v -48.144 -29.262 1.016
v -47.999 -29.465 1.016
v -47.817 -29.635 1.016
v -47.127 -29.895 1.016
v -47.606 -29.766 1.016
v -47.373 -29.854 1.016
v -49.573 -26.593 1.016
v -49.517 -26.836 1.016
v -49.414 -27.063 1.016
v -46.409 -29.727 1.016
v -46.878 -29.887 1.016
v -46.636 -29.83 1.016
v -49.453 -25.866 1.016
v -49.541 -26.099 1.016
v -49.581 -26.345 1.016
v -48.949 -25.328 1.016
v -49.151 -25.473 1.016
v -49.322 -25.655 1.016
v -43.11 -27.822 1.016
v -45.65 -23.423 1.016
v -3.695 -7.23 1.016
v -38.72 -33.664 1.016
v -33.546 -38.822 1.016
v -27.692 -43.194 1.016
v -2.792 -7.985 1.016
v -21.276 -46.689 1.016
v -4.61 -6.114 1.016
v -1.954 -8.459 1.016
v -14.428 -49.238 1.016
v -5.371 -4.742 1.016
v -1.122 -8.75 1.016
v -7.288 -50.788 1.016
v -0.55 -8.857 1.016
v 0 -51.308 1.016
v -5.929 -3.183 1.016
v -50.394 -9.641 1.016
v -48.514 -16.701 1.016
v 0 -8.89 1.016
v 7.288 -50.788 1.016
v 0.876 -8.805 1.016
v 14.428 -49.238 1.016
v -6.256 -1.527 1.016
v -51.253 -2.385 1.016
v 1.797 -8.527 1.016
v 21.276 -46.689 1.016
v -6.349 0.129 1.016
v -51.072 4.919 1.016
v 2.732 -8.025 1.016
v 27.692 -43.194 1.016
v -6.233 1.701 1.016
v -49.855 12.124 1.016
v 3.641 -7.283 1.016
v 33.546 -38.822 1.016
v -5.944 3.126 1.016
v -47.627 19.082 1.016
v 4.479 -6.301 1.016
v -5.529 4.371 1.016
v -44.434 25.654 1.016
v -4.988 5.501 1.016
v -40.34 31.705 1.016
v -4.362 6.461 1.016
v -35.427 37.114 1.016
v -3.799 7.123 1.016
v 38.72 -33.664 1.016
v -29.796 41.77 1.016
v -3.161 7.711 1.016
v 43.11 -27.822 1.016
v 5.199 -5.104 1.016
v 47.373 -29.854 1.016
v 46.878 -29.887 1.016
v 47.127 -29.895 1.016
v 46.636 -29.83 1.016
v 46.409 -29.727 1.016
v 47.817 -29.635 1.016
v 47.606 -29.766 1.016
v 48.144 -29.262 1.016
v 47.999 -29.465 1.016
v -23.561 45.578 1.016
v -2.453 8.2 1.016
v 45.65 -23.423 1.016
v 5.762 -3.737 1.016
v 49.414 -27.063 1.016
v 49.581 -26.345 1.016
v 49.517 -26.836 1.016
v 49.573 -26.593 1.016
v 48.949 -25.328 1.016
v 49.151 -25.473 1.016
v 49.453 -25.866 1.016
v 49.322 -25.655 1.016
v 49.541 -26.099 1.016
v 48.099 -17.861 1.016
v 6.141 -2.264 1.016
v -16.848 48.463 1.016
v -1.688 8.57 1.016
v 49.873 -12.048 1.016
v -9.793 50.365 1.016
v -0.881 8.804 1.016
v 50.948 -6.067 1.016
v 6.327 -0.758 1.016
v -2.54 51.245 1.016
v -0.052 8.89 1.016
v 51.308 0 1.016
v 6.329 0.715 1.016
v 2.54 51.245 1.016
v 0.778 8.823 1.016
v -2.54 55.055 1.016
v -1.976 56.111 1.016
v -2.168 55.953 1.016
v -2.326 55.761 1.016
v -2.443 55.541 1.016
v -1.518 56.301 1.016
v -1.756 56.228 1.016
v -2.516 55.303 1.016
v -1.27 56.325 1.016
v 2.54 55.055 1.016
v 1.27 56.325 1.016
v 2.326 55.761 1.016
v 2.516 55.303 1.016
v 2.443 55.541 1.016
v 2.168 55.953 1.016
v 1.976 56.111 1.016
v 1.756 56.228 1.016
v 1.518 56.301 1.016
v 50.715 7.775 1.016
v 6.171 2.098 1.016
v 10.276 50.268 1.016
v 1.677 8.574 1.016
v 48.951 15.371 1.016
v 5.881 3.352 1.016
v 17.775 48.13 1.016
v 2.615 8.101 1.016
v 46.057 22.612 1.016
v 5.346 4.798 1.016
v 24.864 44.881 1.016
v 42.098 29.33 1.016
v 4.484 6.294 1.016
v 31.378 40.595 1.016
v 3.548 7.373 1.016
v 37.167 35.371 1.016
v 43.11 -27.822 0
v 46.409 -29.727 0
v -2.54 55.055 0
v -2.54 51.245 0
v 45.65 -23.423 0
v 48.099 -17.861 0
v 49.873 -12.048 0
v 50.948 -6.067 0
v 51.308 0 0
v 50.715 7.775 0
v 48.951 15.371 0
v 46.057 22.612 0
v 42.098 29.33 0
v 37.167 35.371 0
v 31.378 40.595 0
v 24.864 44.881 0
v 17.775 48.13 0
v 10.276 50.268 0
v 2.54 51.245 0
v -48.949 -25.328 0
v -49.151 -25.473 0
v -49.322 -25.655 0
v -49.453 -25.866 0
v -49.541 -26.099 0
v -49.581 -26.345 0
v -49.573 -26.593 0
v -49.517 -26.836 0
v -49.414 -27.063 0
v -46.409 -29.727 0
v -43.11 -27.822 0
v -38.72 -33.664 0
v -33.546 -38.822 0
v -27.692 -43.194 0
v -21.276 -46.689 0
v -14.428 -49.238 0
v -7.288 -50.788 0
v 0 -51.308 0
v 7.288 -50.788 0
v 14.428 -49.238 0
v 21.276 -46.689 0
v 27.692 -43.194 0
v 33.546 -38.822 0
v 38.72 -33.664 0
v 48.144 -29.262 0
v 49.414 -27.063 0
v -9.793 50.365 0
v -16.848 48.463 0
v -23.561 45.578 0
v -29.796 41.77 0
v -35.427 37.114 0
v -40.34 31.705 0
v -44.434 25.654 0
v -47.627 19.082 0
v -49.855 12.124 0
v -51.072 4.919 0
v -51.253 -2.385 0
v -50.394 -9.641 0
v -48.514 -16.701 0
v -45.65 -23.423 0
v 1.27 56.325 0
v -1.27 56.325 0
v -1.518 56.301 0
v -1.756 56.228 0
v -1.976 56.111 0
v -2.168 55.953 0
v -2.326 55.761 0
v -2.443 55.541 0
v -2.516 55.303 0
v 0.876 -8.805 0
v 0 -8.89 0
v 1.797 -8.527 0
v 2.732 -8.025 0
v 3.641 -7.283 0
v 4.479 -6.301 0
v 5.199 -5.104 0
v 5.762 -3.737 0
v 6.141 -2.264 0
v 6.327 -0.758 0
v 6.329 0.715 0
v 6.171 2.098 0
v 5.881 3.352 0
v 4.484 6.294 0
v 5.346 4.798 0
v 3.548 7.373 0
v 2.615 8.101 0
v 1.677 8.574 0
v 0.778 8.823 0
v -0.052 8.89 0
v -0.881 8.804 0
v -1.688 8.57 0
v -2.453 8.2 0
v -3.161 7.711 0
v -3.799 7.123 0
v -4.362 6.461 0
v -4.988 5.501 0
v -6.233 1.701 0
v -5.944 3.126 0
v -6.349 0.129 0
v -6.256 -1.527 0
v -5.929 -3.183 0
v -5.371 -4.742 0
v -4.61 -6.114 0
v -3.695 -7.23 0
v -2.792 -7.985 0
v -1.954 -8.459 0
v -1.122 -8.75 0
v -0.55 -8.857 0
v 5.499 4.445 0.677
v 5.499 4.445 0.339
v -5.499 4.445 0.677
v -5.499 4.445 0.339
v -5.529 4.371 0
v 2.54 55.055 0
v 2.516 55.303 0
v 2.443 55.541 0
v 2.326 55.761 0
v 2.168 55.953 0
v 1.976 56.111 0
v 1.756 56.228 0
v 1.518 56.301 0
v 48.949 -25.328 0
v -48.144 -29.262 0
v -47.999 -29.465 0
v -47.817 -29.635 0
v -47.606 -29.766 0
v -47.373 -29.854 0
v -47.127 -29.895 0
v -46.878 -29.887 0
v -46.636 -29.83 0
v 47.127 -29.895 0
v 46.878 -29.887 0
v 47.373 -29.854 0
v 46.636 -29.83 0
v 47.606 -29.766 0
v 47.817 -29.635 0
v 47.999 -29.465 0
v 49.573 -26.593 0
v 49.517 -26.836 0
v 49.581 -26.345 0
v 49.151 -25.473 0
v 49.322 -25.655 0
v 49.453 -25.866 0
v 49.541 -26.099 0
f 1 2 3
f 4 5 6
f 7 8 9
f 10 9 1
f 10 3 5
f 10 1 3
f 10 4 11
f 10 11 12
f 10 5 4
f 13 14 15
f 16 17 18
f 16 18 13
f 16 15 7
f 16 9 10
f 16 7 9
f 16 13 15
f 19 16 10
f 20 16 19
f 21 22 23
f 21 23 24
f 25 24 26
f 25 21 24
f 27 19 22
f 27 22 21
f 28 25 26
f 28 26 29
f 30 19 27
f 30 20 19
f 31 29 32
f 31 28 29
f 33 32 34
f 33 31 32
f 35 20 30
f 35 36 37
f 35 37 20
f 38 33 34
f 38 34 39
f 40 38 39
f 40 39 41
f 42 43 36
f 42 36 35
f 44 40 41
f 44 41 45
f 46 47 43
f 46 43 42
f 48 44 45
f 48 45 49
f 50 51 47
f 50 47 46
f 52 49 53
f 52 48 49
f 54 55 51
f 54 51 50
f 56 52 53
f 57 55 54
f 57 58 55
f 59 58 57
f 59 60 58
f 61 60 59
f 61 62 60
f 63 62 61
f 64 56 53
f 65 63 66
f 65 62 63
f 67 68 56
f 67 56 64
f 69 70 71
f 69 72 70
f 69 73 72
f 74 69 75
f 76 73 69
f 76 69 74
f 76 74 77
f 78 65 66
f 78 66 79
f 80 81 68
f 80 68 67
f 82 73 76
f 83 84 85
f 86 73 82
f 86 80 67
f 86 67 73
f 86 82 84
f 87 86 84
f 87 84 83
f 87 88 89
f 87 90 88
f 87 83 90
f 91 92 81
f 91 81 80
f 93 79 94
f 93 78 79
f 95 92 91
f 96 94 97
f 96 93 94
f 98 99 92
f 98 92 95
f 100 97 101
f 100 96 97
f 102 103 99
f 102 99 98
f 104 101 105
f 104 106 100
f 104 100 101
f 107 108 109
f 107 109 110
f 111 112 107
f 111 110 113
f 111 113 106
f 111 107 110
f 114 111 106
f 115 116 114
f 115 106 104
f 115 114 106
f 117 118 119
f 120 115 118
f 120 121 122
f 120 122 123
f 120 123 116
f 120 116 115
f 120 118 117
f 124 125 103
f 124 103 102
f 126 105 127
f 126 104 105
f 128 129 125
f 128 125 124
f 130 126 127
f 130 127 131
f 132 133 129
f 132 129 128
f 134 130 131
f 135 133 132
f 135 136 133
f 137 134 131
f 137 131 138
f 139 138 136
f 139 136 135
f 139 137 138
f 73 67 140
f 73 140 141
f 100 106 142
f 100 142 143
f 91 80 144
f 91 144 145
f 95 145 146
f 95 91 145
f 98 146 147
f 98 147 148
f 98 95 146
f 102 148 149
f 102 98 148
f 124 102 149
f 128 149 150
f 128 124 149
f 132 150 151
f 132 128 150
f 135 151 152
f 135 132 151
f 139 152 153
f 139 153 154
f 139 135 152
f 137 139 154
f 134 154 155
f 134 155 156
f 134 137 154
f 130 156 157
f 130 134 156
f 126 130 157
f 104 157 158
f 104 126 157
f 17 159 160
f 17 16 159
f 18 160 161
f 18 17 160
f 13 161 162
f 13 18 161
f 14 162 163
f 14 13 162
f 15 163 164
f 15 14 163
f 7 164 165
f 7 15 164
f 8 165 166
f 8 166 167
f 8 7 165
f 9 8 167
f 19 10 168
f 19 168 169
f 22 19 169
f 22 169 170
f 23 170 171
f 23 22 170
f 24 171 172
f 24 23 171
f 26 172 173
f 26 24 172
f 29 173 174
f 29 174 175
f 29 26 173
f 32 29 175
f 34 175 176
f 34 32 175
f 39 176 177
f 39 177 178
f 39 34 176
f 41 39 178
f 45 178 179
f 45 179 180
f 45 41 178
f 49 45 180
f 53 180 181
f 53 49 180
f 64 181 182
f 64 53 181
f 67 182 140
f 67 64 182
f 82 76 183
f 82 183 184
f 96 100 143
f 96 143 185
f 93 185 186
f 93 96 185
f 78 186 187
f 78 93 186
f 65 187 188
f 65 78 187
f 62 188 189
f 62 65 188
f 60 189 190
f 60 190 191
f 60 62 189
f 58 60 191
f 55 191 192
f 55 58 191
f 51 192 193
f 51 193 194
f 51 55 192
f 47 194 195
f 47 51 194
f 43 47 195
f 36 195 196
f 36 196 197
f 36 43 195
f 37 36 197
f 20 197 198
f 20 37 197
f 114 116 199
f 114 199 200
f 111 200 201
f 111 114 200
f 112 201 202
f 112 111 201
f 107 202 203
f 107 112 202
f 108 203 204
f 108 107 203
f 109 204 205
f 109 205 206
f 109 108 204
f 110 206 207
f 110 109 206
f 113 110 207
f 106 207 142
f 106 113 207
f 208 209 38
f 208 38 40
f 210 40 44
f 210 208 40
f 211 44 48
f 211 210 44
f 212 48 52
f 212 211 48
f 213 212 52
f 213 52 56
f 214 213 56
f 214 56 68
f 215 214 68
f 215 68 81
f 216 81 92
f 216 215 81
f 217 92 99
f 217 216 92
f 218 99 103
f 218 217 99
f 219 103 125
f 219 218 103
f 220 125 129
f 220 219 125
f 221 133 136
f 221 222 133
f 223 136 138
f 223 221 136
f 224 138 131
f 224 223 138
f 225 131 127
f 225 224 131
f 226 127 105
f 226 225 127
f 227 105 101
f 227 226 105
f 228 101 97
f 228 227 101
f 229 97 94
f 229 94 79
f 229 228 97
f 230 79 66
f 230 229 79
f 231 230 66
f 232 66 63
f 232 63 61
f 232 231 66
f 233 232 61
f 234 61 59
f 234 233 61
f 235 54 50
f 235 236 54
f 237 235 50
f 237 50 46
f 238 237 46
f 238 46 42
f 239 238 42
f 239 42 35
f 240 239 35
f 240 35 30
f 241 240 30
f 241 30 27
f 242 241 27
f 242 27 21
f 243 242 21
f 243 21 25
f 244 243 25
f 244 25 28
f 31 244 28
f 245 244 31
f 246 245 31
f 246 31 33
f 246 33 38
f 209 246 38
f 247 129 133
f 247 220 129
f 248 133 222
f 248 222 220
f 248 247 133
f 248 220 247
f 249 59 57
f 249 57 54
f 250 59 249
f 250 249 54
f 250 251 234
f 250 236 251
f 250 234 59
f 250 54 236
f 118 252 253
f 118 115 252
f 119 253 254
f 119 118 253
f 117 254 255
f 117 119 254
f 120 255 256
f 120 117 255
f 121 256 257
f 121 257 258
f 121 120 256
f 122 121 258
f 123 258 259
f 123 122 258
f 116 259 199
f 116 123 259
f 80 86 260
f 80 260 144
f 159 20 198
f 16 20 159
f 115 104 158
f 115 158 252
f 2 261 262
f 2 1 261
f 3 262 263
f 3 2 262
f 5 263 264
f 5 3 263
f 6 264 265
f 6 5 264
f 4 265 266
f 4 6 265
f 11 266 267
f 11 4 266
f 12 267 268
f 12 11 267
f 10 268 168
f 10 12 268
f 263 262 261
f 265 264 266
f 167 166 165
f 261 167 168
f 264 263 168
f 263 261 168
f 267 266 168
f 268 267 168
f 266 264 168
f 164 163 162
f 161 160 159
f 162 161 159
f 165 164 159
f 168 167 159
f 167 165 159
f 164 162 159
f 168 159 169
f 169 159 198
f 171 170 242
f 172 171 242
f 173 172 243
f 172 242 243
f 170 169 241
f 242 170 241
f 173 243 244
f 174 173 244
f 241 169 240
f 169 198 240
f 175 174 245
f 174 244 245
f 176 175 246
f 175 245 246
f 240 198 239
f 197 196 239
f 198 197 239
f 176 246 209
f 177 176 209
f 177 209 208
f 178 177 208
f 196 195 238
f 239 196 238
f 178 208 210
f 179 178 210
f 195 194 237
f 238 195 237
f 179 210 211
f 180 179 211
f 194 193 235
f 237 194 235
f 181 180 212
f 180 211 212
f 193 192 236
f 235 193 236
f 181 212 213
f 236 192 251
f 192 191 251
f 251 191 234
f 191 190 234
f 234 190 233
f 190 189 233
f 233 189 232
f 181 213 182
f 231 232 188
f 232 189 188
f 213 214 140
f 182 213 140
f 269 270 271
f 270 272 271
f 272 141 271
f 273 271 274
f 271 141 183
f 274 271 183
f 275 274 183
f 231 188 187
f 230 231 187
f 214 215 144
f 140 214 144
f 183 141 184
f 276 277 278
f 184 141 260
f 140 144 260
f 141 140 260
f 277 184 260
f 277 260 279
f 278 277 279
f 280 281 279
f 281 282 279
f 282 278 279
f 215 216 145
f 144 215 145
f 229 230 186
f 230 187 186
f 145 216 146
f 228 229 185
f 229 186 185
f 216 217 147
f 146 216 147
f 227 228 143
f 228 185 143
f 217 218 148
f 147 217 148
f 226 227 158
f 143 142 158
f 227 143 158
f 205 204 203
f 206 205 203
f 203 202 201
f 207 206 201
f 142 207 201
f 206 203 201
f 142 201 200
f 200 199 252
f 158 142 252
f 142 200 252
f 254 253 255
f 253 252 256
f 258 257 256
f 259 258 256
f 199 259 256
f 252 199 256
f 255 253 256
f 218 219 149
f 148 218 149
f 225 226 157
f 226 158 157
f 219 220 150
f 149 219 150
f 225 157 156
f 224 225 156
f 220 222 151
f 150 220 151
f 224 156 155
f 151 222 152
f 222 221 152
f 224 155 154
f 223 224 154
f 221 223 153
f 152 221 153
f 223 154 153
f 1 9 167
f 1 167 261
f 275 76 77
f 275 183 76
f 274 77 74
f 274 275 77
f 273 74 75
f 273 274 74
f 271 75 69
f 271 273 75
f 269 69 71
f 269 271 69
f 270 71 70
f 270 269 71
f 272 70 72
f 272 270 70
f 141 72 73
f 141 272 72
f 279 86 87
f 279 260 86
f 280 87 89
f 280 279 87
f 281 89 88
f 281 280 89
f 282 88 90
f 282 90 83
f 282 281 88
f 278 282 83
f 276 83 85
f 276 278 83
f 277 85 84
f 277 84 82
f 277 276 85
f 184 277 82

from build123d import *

# Parameters (mm, degrees)
F1_DEPTH = 1.016
F2_DEPTH = 1.0170001
F3_R     = 1.27


with BuildPart() as f1:
    # F0 (on Top) → F1 (new body, symmetric)
    with BuildSketch(Plane.XY):
        with BuildLine():
            ThreePointArc((45.6495498851, -23.422840547), (49.8733293931, -12.0483143738), (51.308, 0))
            ThreePointArc((51.308, 0), (37.1674130388, 35.370811017), (2.54, 51.2450901453))
            Line((2.54, 51.2450901453), (-2.54, 51.2450901453))
            ThreePointArc((-2.54, 51.2450901453), (-44.4340314174, 25.654), (-45.6495498851, -23.422840547))
            Line((-45.6495498851, -23.422840547), (-43.1095498851, -27.8222495983))
            ThreePointArc((-43.1095498851, -27.8222495983), (0, -51.308), (43.1095498851, -27.8222495983))
            Line((43.1095498851, -27.8222495983), (45.6495498851, -23.422840547))
        make_face()
        with BuildLine():
            add(Edge.make_bspline(
                [(0, -8.89), (10.9985226281, -8.89), (5.499261314, 4.445), (0, 17.78), (-5.499261314, 4.445), (-10.9985226281, -8.89), (0, -8.89)],
                knots=[0, 0, 0, 2.0943951024, 2.0943951024, 4.1887902048, 4.1887902048, 6.2831853072, 6.2831853072, 6.2831853072], degree=2, weights=[1, 0.5, 1, 0.5, 1, 0.5, 1]))
        make_face(mode=Mode.SUBTRACT)
        with BuildLine():
            Line((-2.54, 51.2450901453), (2.54, 51.2450901453))
            ThreePointArc((2.54, 51.2450901453), (0, 51.308), (-2.54, 51.2450901453))
        make_face()
        with BuildLine():
            ThreePointArc((-2.54, 51.2450901453), (0, 51.308), (2.54, 51.2450901453))
            Line((2.54, 51.2450901453), (2.54, 56.3250901453))
            Line((2.54, 56.3250901453), (-2.54, 56.3250901453))
            Line((-2.54, 56.3250901453), (-2.54, 51.2450901453))
        make_face()
        with BuildLine():
            Line((50.0489589363, -25.962840547), (45.6495498851, -23.422840547))
            ThreePointArc((45.6495498851, -23.422840547), (44.4340314174, -25.654), (43.1095498851, -27.8222495983))
            Line((43.1095498851, -27.8222495983), (47.5089589363, -30.3622495983))
            Line((47.5089589363, -30.3622495983), (50.0489589363, -25.962840547))
        make_face()
        with BuildLine():
            ThreePointArc((43.1095498851, -27.8222495983), (44.4340314174, -25.654), (45.6495498851, -23.422840547))
            Line((45.6495498851, -23.422840547), (43.1095498851, -27.8222495983))
        make_face()
        with BuildLine():
            Line((-43.1095498851, -27.8222495983), (-45.6495498851, -23.422840547))
            ThreePointArc((-45.6495498851, -23.422840547), (-44.4340314174, -25.654), (-43.1095498851, -27.8222495983))
        make_face()
        with BuildLine():
            ThreePointArc((-43.1095498851, -27.8222495983), (-44.4340314174, -25.654), (-45.6495498851, -23.422840547))
            Line((-45.6495498851, -23.422840547), (-50.0489589363, -25.962840547))
            Line((-50.0489589363, -25.962840547), (-47.5089589363, -30.3622495983))
            Line((-47.5089589363, -30.3622495983), (-43.1095498851, -27.8222495983))
        make_face()
    extrude(amount=F1_DEPTH, both=True)

    # F0 (on Top) → F2 (cut, through all)
    with BuildSketch(Plane.XY):
        with BuildLine():
            ThreePointArc((45.6495498851, -23.422840547), (49.8733293931, -12.0483143738), (51.308, 0))
            ThreePointArc((51.308, 0), (37.1674130388, 35.370811017), (2.54, 51.2450901453))
            Line((2.54, 51.2450901453), (-2.54, 51.2450901453))
            ThreePointArc((-2.54, 51.2450901453), (-44.4340314174, 25.654), (-45.6495498851, -23.422840547))
            Line((-45.6495498851, -23.422840547), (-43.1095498851, -27.8222495983))
            ThreePointArc((-43.1095498851, -27.8222495983), (0, -51.308), (43.1095498851, -27.8222495983))
            Line((43.1095498851, -27.8222495983), (45.6495498851, -23.422840547))
        make_face()
        with BuildLine():
            add(Edge.make_bspline(
                [(0, -8.89), (10.9985226281, -8.89), (5.499261314, 4.445), (0, 17.78), (-5.499261314, 4.445), (-10.9985226281, -8.89), (0, -8.89)],
                knots=[0, 0, 0, 2.0943951024, 2.0943951024, 4.1887902048, 4.1887902048, 6.2831853072, 6.2831853072, 6.2831853072], degree=2, weights=[1, 0.5, 1, 0.5, 1, 0.5, 1]))
        make_face(mode=Mode.SUBTRACT)
        with BuildLine():
            Line((-2.54, 51.2450901453), (2.54, 51.2450901453))
            ThreePointArc((2.54, 51.2450901453), (0, 51.308), (-2.54, 51.2450901453))
        make_face()
        with BuildLine():
            ThreePointArc((-2.54, 51.2450901453), (0, 51.308), (2.54, 51.2450901453))
            Line((2.54, 51.2450901453), (2.54, 56.3250901453))
            Line((2.54, 56.3250901453), (-2.54, 56.3250901453))
            Line((-2.54, 56.3250901453), (-2.54, 51.2450901453))
        make_face()
        with BuildLine():
            Line((50.0489589363, -25.962840547), (45.6495498851, -23.422840547))
            ThreePointArc((45.6495498851, -23.422840547), (44.4340314174, -25.654), (43.1095498851, -27.8222495983))
            Line((43.1095498851, -27.8222495983), (47.5089589363, -30.3622495983))
            Line((47.5089589363, -30.3622495983), (50.0489589363, -25.962840547))
        make_face()
        with BuildLine():
            ThreePointArc((43.1095498851, -27.8222495983), (44.4340314174, -25.654), (45.6495498851, -23.422840547))
            Line((45.6495498851, -23.422840547), (43.1095498851, -27.8222495983))
        make_face()
        with BuildLine():
            Line((-43.1095498851, -27.8222495983), (-45.6495498851, -23.422840547))
            ThreePointArc((-45.6495498851, -23.422840547), (-44.4340314174, -25.654), (-43.1095498851, -27.8222495983))
        make_face()
        with BuildLine():
            ThreePointArc((-43.1095498851, -27.8222495983), (-44.4340314174, -25.654), (-45.6495498851, -23.422840547))
            Line((-45.6495498851, -23.422840547), (-50.0489589363, -25.962840547))
            Line((-50.0489589363, -25.962840547), (-47.5089589363, -30.3622495983))
            Line((-47.5089589363, -30.3622495983), (-43.1095498851, -27.8222495983))
        make_face()
    extrude(amount=-F2_DEPTH, mode=Mode.SUBTRACT)

    # F3
    f3_edges = [f1.edges().sort_by_distance(p)[0] for p in [
        (-50.048959, -25.962841, 0.508),
        (-47.508959, -30.36225, 0.508),
        (2.54, 56.32509, 0.508),
        (-2.54, 56.32509, 0.508),
        (50.048959, -25.962841, 0.508),
        (47.508959, -30.36225, 0.508),
    ]]
    fillet(f3_edges, radius=F3_R)


solid = f1.part
